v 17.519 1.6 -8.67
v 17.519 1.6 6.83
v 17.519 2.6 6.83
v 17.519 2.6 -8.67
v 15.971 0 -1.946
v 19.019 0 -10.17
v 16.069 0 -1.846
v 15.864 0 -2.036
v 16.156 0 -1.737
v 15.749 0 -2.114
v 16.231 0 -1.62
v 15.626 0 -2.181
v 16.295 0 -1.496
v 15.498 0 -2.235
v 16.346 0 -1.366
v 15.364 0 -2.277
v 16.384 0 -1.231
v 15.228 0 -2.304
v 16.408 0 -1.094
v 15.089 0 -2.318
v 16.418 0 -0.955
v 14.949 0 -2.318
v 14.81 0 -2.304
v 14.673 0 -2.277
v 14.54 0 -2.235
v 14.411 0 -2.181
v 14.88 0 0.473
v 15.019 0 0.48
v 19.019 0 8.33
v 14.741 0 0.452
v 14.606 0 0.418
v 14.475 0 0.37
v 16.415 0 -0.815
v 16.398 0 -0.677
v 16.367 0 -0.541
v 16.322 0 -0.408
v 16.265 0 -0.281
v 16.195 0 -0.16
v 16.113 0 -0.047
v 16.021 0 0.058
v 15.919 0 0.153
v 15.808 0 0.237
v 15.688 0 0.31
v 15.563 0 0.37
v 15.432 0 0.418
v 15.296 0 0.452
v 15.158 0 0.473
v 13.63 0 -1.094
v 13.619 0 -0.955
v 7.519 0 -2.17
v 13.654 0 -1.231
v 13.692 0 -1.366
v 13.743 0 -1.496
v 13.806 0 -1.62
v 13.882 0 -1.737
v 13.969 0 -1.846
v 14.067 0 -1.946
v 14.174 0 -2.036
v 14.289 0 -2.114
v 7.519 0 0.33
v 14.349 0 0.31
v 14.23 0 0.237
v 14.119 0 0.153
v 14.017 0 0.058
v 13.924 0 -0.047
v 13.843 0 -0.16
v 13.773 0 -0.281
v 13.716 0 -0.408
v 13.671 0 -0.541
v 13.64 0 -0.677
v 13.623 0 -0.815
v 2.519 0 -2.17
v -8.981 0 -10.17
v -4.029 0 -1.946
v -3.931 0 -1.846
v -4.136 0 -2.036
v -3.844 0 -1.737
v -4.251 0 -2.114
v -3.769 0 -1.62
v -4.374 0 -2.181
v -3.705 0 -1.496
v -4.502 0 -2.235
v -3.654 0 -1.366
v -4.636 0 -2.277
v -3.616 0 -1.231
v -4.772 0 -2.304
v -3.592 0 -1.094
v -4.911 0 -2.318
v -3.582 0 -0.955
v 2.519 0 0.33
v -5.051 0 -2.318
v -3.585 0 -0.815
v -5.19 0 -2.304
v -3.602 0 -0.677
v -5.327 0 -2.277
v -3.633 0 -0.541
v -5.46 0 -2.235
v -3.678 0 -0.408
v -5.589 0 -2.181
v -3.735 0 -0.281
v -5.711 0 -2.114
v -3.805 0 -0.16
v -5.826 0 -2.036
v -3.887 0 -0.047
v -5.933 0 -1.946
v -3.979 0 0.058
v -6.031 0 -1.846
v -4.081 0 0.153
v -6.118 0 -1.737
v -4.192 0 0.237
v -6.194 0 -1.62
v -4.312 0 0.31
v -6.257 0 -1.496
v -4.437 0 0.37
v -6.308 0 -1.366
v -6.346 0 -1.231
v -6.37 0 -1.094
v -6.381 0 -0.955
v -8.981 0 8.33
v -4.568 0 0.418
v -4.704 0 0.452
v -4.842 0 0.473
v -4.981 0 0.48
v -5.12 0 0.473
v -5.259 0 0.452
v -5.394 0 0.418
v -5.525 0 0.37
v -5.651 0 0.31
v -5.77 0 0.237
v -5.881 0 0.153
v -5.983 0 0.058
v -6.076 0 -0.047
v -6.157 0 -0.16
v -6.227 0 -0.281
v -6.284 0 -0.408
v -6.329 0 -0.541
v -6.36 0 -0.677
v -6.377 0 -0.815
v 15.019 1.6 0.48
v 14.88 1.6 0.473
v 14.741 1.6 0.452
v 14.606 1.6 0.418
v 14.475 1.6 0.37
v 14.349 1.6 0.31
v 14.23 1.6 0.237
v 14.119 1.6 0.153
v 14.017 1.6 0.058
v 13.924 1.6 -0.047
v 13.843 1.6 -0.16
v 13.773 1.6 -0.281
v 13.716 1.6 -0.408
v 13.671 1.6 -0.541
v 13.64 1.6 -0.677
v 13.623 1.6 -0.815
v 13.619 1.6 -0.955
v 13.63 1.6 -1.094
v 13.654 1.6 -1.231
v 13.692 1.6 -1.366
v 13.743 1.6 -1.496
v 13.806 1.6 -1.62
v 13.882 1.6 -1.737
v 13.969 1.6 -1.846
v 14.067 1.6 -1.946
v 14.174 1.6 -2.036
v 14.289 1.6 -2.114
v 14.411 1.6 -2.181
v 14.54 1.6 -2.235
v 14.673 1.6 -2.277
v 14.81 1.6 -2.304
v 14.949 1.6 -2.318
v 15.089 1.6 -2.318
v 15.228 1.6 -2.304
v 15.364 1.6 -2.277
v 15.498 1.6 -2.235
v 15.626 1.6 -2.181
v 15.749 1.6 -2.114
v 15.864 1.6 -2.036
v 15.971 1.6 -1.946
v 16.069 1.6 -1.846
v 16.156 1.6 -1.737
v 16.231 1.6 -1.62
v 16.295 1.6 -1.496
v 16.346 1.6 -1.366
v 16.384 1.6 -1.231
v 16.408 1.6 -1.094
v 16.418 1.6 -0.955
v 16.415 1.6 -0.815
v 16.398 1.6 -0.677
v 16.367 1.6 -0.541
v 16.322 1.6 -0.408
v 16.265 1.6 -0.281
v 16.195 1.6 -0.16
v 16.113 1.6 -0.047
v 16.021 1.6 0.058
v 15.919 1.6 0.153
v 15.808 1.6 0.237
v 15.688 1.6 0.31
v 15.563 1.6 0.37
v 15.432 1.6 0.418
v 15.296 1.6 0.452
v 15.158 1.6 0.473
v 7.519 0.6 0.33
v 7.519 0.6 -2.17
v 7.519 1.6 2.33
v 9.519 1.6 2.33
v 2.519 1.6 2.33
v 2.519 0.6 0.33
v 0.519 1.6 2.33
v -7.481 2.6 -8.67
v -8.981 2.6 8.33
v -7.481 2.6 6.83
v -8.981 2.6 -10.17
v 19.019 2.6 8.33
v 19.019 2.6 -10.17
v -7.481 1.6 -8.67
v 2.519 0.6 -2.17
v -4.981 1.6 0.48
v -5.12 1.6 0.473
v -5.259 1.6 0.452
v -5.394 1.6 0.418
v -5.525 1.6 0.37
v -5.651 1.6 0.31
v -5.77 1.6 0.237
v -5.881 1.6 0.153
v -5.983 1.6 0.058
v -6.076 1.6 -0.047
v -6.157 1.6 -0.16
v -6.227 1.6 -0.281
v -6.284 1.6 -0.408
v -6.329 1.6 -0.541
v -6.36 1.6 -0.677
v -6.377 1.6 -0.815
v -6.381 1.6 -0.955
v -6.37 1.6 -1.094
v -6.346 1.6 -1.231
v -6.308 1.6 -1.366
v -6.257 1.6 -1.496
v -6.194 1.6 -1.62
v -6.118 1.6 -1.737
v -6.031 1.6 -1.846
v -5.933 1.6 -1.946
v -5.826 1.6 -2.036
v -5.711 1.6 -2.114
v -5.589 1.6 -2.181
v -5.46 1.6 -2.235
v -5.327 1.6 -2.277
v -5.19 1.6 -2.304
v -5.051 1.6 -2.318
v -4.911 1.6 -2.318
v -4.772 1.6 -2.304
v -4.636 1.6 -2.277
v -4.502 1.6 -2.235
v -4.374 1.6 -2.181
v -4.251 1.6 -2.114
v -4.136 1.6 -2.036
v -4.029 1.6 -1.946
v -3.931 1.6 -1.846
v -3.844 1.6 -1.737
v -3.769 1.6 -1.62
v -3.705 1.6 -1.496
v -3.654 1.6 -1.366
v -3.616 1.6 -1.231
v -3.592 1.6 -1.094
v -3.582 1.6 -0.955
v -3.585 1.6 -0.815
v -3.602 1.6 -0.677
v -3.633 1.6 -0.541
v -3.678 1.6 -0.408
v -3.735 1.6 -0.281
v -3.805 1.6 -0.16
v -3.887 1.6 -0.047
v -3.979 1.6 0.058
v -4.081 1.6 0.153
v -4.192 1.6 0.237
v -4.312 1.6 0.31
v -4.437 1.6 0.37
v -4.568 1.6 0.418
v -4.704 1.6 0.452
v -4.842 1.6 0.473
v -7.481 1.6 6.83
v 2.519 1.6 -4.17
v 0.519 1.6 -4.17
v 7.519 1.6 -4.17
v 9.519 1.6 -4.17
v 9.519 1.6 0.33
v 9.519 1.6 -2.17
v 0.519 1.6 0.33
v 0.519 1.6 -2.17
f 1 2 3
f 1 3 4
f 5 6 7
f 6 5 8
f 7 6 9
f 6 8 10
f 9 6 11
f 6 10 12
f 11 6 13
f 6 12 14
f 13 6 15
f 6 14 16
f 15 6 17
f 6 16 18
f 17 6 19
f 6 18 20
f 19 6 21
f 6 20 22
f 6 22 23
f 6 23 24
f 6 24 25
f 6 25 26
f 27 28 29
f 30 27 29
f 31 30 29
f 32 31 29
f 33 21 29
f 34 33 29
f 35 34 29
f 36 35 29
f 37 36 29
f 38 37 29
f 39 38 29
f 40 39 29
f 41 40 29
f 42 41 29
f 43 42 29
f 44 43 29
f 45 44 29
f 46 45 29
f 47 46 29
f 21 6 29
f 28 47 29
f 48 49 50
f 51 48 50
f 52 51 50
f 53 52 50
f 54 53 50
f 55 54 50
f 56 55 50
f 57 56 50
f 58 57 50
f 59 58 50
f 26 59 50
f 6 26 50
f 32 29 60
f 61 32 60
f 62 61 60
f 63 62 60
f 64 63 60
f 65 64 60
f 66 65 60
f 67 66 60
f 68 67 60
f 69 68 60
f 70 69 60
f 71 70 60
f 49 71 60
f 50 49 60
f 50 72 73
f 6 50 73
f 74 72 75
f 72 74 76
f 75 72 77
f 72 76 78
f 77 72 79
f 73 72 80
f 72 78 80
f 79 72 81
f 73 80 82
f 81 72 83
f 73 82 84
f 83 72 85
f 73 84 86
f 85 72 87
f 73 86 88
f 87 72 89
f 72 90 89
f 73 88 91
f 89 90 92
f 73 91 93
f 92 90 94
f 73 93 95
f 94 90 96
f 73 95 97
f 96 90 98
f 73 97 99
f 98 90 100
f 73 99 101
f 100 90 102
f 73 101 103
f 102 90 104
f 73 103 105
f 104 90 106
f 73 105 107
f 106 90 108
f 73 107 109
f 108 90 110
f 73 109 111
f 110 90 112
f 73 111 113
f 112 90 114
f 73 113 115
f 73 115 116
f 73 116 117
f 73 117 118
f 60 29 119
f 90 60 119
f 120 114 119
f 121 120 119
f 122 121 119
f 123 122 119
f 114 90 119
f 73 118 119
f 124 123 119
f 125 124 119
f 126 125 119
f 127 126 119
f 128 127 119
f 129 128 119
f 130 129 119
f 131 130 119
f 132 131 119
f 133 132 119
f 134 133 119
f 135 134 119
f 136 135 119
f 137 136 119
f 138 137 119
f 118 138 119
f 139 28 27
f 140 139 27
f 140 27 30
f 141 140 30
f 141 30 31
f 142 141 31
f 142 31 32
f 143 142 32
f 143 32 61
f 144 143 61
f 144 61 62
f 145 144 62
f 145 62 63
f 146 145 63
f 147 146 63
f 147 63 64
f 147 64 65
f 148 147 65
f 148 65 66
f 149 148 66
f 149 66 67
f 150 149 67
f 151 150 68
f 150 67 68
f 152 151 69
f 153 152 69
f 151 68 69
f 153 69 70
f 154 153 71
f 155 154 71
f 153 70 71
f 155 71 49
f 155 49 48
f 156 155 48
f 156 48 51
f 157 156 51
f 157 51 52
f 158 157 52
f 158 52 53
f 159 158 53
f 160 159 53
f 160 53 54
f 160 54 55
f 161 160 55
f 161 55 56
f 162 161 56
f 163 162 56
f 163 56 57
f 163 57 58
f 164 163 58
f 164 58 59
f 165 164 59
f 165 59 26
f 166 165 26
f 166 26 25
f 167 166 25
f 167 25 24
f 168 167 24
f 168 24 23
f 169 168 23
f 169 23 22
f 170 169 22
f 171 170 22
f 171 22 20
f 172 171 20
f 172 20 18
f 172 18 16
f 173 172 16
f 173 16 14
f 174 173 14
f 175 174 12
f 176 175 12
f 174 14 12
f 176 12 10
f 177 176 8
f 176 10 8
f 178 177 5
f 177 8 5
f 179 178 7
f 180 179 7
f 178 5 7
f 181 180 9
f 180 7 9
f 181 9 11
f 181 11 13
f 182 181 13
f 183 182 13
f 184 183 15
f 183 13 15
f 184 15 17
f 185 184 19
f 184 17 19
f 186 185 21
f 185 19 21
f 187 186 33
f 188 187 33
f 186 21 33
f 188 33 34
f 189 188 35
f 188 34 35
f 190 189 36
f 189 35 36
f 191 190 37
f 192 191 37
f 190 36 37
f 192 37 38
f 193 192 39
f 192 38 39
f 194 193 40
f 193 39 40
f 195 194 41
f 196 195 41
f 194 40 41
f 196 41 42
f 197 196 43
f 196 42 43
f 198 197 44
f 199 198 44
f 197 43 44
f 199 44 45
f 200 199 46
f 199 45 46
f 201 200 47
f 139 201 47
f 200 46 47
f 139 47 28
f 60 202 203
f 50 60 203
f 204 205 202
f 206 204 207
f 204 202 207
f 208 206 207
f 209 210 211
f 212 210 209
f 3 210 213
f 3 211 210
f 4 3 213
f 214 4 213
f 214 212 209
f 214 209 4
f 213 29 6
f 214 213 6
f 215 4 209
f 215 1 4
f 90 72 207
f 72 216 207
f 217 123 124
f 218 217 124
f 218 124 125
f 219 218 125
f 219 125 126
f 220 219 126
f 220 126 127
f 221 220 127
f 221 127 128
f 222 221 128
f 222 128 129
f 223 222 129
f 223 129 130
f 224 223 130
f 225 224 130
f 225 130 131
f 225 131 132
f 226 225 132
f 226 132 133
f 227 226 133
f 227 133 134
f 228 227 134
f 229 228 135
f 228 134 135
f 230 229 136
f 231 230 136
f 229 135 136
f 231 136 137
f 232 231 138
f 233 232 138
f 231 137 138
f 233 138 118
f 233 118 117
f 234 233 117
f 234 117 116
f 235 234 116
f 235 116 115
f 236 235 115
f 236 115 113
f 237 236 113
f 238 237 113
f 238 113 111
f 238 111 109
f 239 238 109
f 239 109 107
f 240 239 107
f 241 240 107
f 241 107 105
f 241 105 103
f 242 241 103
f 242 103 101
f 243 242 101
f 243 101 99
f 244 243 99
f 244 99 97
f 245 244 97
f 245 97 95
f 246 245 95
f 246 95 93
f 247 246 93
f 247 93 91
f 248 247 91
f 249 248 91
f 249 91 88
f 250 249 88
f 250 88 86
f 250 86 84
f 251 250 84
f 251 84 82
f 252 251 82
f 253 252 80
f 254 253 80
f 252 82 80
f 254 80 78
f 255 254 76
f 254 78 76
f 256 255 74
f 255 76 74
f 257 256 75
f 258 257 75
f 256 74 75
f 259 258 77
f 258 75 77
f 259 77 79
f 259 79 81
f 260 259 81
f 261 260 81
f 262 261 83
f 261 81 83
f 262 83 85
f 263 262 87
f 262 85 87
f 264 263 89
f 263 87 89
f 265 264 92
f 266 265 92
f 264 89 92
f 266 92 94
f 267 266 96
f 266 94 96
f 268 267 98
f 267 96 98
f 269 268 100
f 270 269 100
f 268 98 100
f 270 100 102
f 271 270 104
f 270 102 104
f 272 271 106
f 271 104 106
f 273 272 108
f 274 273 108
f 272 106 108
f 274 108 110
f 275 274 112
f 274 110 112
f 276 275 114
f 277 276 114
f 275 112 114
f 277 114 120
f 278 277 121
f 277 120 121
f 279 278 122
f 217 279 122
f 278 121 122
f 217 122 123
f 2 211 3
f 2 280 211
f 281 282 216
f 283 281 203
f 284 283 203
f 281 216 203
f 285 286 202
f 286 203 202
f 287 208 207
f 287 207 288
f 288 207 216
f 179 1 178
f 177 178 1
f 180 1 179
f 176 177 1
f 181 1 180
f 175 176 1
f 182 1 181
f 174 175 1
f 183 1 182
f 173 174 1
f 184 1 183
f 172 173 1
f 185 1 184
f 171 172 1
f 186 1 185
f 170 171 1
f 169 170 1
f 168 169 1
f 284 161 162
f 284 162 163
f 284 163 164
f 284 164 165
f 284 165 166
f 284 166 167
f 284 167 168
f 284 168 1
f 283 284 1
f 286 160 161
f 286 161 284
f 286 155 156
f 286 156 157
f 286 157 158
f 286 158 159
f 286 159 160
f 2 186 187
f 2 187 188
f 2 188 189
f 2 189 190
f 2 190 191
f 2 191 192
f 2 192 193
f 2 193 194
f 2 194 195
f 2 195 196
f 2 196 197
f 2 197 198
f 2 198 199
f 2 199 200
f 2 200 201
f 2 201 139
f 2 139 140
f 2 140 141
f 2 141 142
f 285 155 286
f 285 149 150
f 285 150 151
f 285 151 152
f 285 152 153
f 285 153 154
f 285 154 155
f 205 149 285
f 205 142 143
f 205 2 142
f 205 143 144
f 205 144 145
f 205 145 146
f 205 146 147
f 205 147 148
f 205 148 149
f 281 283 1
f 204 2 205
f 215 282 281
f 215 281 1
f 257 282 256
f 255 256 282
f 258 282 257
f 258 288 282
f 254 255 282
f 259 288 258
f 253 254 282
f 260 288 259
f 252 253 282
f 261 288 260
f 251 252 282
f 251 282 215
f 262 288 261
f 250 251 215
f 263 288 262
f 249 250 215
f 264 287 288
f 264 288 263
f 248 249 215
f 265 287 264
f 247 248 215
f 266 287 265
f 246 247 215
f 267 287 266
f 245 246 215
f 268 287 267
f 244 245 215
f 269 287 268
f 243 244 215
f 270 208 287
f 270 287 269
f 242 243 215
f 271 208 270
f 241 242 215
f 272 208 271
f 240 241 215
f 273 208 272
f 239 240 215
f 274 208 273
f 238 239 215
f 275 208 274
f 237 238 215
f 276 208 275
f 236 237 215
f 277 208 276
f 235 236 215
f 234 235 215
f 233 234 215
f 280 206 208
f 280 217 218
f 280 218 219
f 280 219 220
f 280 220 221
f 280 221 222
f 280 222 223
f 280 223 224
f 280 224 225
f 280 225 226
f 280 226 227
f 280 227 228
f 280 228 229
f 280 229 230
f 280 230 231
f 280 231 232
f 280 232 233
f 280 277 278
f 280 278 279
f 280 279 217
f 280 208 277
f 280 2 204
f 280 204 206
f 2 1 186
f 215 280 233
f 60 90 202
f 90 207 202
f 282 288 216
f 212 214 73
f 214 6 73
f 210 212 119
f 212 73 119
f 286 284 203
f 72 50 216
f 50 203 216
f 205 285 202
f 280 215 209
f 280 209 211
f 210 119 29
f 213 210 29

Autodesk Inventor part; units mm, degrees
ref_plane "YZ Plane" through (0, 0, 0) normal (1, 0, 0) x (0, 1, 0)
ref_plane "XZ Plane" through (0, 0, 0) normal (0, 1, 0) x (-1, 0, 0)
ref_plane "XY Plane" through (0, 0, 0) normal (0, 0, 1) x (1, 0, 0)
sketch "Эскиз1" plane through (0, 0, 0) normal (0, 1, 0) x (-1, 0, 0)
  line L0 (8.9811, 8.3302) -> (-19.0189, 8.3302)
  line L1 (-19.0189, 8.3302) -> (-19.0189, -10.1698)
  line L2 (-19.0189, -10.1698) -> (8.9811, -10.1698)
  line L3 (8.9811, -10.1698) -> (8.9811, 8.3302)
  point P0 (0, 0)
  dimension "d0" = 28
  dimension "d1" = 18.5
extrude "Выдавливание1" add sketch "Эскиз1" along normal blind 1.6
sketch "Эскиз2" plane through (0, 1.6, 0) normal (0, 1, 0) x (1, 0, 0)
  line L0 (-8.9811, -8.3302) -> (19.0189, -8.3302) projected
  line L1 (19.0189, -8.3302) -> (19.0189, 10.1698) projected
  line L2 (19.0189, 10.1698) -> (-8.9811, 10.1698) projected
  line L3 (-8.9811, 10.1698) -> (-8.9811, -8.3302) projected
  line L4 (-7.4811, -6.8302) -> (17.5189, -6.8302)
  line L5 (17.5189, -6.8302) -> (17.5189, 8.6698)
  line L6 (17.5189, 8.6698) -> (-7.4811, 8.6698)
  line L7 (-7.4811, 8.6698) -> (-7.4811, -6.8302)
  point P0 (0, 0)
  dimension "d4" = 1.5
extrude "Выдавливание2" add sketch "Эскиз2" along normal blind 1
sketch "Эскиз3" plane through (0, 1.6, 0) normal (0, 1, 0) x (1, 0, 0)
  line L0 (2.5189, -0.3302) -> (7.5189, -0.3302)
  line L1 (7.5189, -0.3302) -> (7.5189, 2.1698)
  line L2 (7.5189, 2.1698) -> (2.5189, 2.1698)
  line L3 (2.5189, 2.1698) -> (2.5189, -0.3302)
  line L4 (-7.4811, 8.6698) -> (-7.4811, -6.8302) construction
  line L5 (-7.4811, -6.8302) -> (17.5189, -6.8302) construction
  line L6 (17.5189, -6.8302) -> (17.5189, 8.6698) construction
  line L7 (17.5189, 8.6698) -> (-7.4811, 8.6698) construction
  line L8 (5.0189, -0.3302) -> (5.0189, -6.8302) construction
  line L9 (5.0189, 2.1698) -> (5.0189, 8.6698) construction
  line L10 (-7.4811, 0.9198) -> (2.5189, 0.9198) construction
  line L11 (7.5189, 0.9198) -> (17.5189, 0.9198) construction
  point P0 (0, 0)
  dimension "d7" = 5
  dimension "d8" = 2.5
extrude "Выдавливание3" cut sketch "Эскиз3" against normal through all
chamfer "Фаска1" distance 2 distance2 1 1 edges at (5.0189, 1.6, -2.1698) measured on face at (5.8522, 1.6, -6.5031)
chamfer "Фаска2" distance 2 distance2 1 1 edges at (2.5189, 1.6, -0.9198) measured on face at (5.8522, 1.6, 4.6635)
chamfer "Фаска3" distance 2 distance2 1 1 edges at (5.0189, 1.6, 0.3302) measured on face at (5.8522, 1.6, 4.6635)
chamfer "Фаска4" distance 2 distance2 1 1 edges at (7.5189, 1.6, -0.9198) measured on face at (14.1855, 1.6, -0.5031)
sketch "Эскиз4" plane through (0, 1.6, 0) normal (0, 1, 0) x (1, 0, 0)
  line L0 (-7.4811, 8.6698) -> (17.5189, 8.6698) projected
  line L1 (-4.9811, 0.9198) -> (-7.4811, 0.9198) construction
  line L2 (15.0189, 0.9198) -> (17.5189, 0.9198) construction
  line L3 (-7.4811, -6.8302) -> (-7.4811, 8.6698) construction
  line L4 (17.5189, 8.6698) -> (17.5189, -6.8302) construction
  point P0 (0, 0)
  dimension "d24" = 20
hole "Отверстие1" at (15.0189, 1.6, -0.9198) at (-4.9811, 1.6, -0.9198) direction (0, -1, 0) diameter 2.8 end through all
properties part number "SensorShield"
